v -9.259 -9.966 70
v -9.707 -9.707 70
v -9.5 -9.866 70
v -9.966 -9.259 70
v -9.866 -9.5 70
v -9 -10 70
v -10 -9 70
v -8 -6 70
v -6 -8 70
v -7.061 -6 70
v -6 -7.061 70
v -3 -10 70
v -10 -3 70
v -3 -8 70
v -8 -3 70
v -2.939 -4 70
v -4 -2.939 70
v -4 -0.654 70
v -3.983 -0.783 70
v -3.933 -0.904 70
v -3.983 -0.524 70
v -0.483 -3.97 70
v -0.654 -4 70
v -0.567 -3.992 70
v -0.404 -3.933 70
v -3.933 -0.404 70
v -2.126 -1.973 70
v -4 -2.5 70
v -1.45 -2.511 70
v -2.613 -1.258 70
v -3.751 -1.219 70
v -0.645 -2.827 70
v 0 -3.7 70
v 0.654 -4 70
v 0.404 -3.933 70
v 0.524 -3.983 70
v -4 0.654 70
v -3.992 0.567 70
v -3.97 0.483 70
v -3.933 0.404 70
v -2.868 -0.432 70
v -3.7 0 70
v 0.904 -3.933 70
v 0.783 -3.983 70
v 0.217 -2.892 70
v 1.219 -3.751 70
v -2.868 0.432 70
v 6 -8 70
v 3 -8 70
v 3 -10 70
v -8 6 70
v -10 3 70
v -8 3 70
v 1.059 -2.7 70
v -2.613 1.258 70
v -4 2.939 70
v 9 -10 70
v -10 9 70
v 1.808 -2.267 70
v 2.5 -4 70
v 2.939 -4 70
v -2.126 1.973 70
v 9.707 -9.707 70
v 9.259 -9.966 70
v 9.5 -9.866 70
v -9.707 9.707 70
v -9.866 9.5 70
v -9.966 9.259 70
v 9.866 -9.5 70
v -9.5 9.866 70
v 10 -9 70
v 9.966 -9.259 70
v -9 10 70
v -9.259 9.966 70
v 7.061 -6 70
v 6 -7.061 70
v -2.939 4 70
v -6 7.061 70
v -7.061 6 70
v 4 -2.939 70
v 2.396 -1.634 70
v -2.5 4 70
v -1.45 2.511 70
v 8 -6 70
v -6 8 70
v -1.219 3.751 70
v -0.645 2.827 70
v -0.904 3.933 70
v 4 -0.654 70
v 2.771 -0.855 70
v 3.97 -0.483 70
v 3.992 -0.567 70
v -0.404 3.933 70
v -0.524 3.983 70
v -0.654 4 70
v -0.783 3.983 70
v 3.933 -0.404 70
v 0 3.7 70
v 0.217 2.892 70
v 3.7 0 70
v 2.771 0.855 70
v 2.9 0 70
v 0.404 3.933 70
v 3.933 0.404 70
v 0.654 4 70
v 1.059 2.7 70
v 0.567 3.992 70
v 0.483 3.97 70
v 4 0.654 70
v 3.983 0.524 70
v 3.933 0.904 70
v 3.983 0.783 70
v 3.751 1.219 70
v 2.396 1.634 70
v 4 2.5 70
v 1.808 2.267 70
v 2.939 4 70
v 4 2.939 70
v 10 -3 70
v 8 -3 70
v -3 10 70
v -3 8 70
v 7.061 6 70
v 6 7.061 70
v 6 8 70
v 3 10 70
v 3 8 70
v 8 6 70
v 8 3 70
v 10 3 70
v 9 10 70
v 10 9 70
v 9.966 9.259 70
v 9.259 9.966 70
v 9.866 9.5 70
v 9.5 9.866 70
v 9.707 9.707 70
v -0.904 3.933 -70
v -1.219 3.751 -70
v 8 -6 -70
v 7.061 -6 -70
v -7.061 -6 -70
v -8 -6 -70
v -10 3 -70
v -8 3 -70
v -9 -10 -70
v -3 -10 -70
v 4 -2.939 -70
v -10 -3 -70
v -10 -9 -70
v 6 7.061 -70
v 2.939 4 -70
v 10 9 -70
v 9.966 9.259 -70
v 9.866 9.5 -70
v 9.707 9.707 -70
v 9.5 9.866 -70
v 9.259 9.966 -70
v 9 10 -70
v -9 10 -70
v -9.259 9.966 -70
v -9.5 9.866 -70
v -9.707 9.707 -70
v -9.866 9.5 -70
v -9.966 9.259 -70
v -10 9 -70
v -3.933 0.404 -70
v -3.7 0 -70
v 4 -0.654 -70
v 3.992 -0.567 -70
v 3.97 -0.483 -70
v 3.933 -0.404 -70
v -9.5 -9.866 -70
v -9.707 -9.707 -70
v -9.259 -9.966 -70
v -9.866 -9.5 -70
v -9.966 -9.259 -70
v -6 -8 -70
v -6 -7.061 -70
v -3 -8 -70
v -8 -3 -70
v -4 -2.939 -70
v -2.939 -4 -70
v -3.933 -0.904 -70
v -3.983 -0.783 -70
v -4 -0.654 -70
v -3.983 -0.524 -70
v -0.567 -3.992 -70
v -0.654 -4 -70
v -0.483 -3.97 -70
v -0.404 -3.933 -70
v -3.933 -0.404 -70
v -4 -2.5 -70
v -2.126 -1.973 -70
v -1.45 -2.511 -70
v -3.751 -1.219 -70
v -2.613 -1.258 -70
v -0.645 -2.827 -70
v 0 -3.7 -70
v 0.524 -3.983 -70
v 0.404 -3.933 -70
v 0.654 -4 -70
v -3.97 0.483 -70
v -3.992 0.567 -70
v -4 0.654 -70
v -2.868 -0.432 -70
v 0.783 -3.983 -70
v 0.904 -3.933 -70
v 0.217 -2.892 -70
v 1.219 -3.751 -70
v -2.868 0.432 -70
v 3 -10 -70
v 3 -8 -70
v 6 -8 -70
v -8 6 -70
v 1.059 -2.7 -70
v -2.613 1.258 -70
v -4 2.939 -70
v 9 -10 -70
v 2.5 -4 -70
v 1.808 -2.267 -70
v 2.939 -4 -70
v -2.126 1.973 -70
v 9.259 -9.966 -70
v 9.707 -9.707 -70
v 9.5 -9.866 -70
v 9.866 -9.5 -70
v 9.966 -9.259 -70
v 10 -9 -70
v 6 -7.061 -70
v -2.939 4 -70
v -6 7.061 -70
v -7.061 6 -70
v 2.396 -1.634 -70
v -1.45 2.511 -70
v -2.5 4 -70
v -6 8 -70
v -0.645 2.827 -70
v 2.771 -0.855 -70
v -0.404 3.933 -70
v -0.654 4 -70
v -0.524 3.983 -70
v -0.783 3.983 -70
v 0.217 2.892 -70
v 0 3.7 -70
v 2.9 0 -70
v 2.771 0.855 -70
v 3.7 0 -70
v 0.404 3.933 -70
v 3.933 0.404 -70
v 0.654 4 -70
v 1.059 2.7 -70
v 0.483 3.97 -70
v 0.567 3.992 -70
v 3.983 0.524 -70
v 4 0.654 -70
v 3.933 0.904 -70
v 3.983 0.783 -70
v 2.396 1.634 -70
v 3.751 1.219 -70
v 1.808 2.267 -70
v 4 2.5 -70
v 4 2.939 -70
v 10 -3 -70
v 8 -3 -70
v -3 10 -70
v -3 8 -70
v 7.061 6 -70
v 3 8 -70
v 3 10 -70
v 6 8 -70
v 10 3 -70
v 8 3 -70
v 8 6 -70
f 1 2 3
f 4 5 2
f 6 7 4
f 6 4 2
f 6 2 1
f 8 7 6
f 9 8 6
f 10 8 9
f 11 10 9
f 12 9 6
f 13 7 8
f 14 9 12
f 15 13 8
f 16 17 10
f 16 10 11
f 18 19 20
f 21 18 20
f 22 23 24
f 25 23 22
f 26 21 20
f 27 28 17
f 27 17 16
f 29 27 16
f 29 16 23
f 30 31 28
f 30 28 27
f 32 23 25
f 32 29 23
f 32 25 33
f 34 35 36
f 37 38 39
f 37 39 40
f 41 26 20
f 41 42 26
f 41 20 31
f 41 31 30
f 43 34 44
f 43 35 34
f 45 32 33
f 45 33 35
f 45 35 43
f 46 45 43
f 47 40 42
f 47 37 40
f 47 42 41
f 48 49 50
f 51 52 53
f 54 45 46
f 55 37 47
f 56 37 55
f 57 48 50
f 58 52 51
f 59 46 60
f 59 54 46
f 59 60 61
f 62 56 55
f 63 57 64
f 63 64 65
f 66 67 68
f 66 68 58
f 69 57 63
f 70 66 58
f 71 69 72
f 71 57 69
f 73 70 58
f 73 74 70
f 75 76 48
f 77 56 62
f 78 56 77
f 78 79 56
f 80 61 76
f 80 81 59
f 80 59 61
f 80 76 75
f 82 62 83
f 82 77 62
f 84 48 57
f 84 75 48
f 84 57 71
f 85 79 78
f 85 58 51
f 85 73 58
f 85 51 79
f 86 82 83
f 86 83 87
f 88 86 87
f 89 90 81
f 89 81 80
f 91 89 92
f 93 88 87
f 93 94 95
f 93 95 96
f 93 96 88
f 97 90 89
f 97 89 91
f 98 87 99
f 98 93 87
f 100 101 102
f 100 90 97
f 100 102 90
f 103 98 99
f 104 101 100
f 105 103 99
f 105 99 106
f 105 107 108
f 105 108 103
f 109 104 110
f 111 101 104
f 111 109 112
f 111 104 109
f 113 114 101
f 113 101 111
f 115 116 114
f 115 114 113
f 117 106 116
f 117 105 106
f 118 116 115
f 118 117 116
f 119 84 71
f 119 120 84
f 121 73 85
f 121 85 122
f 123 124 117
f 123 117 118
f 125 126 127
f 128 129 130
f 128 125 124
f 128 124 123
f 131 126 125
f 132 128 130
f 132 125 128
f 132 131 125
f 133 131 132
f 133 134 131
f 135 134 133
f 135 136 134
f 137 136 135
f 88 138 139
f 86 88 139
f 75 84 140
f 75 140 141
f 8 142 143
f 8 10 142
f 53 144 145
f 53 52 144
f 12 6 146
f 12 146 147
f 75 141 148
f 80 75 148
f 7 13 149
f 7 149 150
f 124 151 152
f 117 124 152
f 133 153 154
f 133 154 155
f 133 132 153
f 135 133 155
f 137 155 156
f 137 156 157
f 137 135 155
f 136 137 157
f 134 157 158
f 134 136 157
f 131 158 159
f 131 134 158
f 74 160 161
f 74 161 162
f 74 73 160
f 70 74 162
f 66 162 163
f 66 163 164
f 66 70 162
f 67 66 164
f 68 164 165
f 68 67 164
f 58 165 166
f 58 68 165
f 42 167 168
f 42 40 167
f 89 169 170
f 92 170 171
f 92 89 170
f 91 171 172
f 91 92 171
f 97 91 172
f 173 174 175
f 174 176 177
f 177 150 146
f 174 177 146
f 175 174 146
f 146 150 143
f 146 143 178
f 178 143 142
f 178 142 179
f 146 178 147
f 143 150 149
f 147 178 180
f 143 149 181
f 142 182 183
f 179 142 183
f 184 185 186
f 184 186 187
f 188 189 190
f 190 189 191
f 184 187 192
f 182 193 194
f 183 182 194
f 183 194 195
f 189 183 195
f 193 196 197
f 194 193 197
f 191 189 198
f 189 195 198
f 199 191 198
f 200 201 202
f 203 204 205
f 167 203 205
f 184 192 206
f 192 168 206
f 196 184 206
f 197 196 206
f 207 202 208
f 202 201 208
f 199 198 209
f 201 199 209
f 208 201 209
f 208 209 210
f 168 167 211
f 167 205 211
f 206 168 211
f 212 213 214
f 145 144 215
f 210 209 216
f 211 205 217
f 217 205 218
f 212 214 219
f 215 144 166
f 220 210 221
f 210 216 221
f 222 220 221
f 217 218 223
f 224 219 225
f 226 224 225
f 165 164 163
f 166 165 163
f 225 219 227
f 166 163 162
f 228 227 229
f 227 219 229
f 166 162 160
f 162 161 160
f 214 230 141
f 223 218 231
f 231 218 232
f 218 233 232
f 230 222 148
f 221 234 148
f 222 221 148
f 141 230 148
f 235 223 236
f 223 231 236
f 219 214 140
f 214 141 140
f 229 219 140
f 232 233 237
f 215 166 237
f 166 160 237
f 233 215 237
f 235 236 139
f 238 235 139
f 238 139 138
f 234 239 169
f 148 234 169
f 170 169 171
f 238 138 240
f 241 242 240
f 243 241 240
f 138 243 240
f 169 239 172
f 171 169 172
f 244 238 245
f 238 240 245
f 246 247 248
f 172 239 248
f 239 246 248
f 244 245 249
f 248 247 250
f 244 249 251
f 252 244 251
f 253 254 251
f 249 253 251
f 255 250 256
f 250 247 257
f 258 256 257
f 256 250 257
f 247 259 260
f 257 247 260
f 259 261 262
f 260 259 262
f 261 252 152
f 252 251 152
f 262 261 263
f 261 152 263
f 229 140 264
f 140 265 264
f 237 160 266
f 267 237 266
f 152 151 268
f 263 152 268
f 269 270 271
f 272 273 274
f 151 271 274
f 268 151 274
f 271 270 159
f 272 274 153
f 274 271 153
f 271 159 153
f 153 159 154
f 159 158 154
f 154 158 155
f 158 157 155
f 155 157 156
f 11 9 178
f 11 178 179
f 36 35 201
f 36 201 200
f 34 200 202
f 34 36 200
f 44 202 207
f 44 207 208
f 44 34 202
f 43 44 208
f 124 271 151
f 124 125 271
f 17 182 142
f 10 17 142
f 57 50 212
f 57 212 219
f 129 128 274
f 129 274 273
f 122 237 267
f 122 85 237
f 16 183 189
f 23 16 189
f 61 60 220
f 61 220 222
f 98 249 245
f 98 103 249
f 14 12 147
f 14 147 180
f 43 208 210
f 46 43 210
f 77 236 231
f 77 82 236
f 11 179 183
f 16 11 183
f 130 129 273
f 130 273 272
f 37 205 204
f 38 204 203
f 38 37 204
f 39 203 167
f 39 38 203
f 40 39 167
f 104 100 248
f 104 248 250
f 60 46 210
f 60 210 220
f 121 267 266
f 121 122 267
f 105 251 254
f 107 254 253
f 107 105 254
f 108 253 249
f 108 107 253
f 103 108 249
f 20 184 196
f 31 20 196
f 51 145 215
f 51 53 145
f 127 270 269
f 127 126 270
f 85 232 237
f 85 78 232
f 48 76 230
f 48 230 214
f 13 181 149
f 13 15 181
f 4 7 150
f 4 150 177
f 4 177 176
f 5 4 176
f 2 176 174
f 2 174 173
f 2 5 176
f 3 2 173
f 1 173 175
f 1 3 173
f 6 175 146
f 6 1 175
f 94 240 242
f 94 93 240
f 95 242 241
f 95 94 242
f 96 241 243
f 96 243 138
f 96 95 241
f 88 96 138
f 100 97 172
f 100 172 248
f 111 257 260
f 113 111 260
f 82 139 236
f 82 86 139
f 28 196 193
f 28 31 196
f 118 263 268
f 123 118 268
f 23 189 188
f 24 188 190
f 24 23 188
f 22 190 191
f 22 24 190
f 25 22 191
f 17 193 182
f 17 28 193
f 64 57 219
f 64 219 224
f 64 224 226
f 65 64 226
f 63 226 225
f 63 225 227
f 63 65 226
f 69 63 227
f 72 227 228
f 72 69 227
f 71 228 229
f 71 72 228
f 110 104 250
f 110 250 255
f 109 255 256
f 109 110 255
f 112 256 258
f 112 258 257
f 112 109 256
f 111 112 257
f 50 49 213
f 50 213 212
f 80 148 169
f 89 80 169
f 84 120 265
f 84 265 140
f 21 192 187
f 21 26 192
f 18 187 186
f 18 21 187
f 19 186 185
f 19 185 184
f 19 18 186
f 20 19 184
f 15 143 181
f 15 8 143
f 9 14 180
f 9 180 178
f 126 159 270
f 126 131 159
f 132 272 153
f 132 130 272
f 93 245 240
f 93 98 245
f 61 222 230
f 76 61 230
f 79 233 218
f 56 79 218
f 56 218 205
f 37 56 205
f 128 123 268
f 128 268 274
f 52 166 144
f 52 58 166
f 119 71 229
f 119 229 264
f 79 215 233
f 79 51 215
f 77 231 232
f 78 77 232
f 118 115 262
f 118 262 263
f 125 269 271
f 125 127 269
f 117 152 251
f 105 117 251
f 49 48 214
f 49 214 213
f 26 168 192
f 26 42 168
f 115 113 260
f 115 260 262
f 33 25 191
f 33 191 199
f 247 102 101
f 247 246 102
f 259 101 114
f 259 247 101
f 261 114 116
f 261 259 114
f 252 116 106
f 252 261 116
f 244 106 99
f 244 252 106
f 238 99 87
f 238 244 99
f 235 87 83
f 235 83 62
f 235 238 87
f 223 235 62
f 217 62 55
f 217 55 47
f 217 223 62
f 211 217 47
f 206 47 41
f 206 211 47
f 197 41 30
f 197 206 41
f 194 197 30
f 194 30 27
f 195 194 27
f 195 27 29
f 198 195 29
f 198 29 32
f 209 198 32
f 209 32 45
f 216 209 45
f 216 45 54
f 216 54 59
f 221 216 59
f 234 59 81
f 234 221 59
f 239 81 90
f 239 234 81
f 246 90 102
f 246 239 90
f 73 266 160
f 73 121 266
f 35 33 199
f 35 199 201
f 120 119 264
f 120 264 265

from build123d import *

# Parameters (mm, degrees)
SKETCH001_R = 2.9
PAD_DEPTH   = 70


with BuildPart() as part:
    # Sketch001 → Pad (new body, symmetric)
    with BuildSketch(Plane.XY):
        with BuildLine():
            Line((-8, -3), (-10, -3))
            Line((-10, -3), (-10, -9))
            ThreePointArc((-10, -9), (-9.707107, -9.707107), (-9, -10))
            Line((-9, -10), (-3, -10))
            Line((-3, -10), (-3, -8))
            Line((-3, -8), (-6, -8))
            Line((-6, -8), (-6, -7.06066))
            Line((-6, -7.06066), (-2.93934, -4))
            Line((-2.93934, -4), (-0.65359, -4))
            ThreePointArc((-0.65359, -4), (-0.52418, -3.982963), (-0.40359, -3.933013))
            Line((-0.40359, -3.933013), (0, -3.7))
            Line((0, -3.7), (0.40359, -3.933013))
            ThreePointArc((0.40359, -3.933013), (0.65359, -4), (0.90359, -3.933013))
            Line((0.90359, -3.933013), (1.218886, -3.750977))
            Line((1.218886, -3.750977), (2.5, -4))
            Line((2.5, -4), (2.93934, -4))
            Line((2.93934, -4), (6, -7.06066))
            Line((6, -7.06066), (6, -8))
            Line((6, -8), (3, -8))
            Line((3, -8), (3, -10))
            Line((3, -10), (9, -10))
            ThreePointArc((9, -10), (9.707107, -9.707107), (10, -9))
            Line((10, -9), (10, -3))
            Line((10, -3), (8, -3))
            Line((8, -3), (8, -6))
            Line((8, -6), (7.06066, -6))
            Line((7.06066, -6), (4, -2.93934))
            Line((4, -2.93934), (4, -0.65359))
            ThreePointArc((4, -0.65359), (3.982963, -0.52418), (3.933013, -0.40359))
            Line((3.933013, -0.40359), (3.7, 0))
            Line((3.7, 0), (3.933013, 0.40359))
            ThreePointArc((3.933013, 0.40359), (4, 0.65359), (3.933013, 0.90359))
            Line((3.933013, 0.90359), (3.750977, 1.218886))
            Line((3.750977, 1.218886), (4, 2.5))
            Line((4, 2.5), (4, 2.93934))
            Line((4, 2.93934), (7.06066, 6))
            Line((7.06066, 6), (8, 6))
            Line((8, 6), (8, 3))
            Line((8, 3), (10, 3))
            Line((10, 3), (10, 9))
            ThreePointArc((10, 9), (9.707107, 9.707107), (9, 10))
            Line((9, 10), (3, 10))
            Line((3, 10), (3, 8))
            Line((3, 8), (6, 8))
            Line((6, 8), (6, 7.06066))
            Line((6, 7.06066), (2.93934, 4))
            Line((2.93934, 4), (0.65359, 4))
            ThreePointArc((0.65359, 4), (0.52418, 3.982963), (0.40359, 3.933013))
            Line((0.40359, 3.933013), (0, 3.7))
            Line((0, 3.7), (-0.40359, 3.933013))
            ThreePointArc((-0.40359, 3.933013), (-0.65359, 4), (-0.90359, 3.933013))
            Line((-0.90359, 3.933013), (-1.218886, 3.750977))
            Line((-1.218886, 3.750977), (-2.5, 4))
            Line((-2.5, 4), (-2.93934, 4))
            Line((-2.93934, 4), (-6, 7.06066))
            Line((-6, 7.06066), (-6, 8))
            Line((-6, 8), (-3, 8))
            Line((-3, 8), (-3, 10))
            Line((-3, 10), (-9, 10))
            ThreePointArc((-9, 10), (-9.707107, 9.707107), (-10, 9))
            Line((-10, 9), (-10, 3))
            Line((-10, 3), (-8, 3))
            Line((-8, 3), (-8, 6))
            Line((-8, 6), (-7.06066, 6))
            Line((-7.06066, 6), (-4, 2.93934))
            Line((-4, 2.93934), (-4, 0.65359))
            ThreePointArc((-4, 0.65359), (-3.982963, 0.52418), (-3.933013, 0.40359))
            Line((-3.933013, 0.40359), (-3.7, 0))
            Line((-3.7, 0), (-3.933013, -0.40359))
            ThreePointArc((-3.933013, -0.40359), (-4, -0.65359), (-3.933013, -0.90359))
            Line((-3.933013, -0.90359), (-3.750977, -1.218886))
            Line((-3.750977, -1.218886), (-4, -2.5))
            Line((-4, -2.5), (-4, -2.93934))
            Line((-4, -2.93934), (-7.06066, -6))
            Line((-7.06066, -6), (-8, -6))
            Line((-8, -6), (-8, -3))
        make_face()
        Circle(SKETCH001_R, mode=Mode.SUBTRACT)
    extrude(amount=PAD_DEPTH, both=True)


solid = part.part
